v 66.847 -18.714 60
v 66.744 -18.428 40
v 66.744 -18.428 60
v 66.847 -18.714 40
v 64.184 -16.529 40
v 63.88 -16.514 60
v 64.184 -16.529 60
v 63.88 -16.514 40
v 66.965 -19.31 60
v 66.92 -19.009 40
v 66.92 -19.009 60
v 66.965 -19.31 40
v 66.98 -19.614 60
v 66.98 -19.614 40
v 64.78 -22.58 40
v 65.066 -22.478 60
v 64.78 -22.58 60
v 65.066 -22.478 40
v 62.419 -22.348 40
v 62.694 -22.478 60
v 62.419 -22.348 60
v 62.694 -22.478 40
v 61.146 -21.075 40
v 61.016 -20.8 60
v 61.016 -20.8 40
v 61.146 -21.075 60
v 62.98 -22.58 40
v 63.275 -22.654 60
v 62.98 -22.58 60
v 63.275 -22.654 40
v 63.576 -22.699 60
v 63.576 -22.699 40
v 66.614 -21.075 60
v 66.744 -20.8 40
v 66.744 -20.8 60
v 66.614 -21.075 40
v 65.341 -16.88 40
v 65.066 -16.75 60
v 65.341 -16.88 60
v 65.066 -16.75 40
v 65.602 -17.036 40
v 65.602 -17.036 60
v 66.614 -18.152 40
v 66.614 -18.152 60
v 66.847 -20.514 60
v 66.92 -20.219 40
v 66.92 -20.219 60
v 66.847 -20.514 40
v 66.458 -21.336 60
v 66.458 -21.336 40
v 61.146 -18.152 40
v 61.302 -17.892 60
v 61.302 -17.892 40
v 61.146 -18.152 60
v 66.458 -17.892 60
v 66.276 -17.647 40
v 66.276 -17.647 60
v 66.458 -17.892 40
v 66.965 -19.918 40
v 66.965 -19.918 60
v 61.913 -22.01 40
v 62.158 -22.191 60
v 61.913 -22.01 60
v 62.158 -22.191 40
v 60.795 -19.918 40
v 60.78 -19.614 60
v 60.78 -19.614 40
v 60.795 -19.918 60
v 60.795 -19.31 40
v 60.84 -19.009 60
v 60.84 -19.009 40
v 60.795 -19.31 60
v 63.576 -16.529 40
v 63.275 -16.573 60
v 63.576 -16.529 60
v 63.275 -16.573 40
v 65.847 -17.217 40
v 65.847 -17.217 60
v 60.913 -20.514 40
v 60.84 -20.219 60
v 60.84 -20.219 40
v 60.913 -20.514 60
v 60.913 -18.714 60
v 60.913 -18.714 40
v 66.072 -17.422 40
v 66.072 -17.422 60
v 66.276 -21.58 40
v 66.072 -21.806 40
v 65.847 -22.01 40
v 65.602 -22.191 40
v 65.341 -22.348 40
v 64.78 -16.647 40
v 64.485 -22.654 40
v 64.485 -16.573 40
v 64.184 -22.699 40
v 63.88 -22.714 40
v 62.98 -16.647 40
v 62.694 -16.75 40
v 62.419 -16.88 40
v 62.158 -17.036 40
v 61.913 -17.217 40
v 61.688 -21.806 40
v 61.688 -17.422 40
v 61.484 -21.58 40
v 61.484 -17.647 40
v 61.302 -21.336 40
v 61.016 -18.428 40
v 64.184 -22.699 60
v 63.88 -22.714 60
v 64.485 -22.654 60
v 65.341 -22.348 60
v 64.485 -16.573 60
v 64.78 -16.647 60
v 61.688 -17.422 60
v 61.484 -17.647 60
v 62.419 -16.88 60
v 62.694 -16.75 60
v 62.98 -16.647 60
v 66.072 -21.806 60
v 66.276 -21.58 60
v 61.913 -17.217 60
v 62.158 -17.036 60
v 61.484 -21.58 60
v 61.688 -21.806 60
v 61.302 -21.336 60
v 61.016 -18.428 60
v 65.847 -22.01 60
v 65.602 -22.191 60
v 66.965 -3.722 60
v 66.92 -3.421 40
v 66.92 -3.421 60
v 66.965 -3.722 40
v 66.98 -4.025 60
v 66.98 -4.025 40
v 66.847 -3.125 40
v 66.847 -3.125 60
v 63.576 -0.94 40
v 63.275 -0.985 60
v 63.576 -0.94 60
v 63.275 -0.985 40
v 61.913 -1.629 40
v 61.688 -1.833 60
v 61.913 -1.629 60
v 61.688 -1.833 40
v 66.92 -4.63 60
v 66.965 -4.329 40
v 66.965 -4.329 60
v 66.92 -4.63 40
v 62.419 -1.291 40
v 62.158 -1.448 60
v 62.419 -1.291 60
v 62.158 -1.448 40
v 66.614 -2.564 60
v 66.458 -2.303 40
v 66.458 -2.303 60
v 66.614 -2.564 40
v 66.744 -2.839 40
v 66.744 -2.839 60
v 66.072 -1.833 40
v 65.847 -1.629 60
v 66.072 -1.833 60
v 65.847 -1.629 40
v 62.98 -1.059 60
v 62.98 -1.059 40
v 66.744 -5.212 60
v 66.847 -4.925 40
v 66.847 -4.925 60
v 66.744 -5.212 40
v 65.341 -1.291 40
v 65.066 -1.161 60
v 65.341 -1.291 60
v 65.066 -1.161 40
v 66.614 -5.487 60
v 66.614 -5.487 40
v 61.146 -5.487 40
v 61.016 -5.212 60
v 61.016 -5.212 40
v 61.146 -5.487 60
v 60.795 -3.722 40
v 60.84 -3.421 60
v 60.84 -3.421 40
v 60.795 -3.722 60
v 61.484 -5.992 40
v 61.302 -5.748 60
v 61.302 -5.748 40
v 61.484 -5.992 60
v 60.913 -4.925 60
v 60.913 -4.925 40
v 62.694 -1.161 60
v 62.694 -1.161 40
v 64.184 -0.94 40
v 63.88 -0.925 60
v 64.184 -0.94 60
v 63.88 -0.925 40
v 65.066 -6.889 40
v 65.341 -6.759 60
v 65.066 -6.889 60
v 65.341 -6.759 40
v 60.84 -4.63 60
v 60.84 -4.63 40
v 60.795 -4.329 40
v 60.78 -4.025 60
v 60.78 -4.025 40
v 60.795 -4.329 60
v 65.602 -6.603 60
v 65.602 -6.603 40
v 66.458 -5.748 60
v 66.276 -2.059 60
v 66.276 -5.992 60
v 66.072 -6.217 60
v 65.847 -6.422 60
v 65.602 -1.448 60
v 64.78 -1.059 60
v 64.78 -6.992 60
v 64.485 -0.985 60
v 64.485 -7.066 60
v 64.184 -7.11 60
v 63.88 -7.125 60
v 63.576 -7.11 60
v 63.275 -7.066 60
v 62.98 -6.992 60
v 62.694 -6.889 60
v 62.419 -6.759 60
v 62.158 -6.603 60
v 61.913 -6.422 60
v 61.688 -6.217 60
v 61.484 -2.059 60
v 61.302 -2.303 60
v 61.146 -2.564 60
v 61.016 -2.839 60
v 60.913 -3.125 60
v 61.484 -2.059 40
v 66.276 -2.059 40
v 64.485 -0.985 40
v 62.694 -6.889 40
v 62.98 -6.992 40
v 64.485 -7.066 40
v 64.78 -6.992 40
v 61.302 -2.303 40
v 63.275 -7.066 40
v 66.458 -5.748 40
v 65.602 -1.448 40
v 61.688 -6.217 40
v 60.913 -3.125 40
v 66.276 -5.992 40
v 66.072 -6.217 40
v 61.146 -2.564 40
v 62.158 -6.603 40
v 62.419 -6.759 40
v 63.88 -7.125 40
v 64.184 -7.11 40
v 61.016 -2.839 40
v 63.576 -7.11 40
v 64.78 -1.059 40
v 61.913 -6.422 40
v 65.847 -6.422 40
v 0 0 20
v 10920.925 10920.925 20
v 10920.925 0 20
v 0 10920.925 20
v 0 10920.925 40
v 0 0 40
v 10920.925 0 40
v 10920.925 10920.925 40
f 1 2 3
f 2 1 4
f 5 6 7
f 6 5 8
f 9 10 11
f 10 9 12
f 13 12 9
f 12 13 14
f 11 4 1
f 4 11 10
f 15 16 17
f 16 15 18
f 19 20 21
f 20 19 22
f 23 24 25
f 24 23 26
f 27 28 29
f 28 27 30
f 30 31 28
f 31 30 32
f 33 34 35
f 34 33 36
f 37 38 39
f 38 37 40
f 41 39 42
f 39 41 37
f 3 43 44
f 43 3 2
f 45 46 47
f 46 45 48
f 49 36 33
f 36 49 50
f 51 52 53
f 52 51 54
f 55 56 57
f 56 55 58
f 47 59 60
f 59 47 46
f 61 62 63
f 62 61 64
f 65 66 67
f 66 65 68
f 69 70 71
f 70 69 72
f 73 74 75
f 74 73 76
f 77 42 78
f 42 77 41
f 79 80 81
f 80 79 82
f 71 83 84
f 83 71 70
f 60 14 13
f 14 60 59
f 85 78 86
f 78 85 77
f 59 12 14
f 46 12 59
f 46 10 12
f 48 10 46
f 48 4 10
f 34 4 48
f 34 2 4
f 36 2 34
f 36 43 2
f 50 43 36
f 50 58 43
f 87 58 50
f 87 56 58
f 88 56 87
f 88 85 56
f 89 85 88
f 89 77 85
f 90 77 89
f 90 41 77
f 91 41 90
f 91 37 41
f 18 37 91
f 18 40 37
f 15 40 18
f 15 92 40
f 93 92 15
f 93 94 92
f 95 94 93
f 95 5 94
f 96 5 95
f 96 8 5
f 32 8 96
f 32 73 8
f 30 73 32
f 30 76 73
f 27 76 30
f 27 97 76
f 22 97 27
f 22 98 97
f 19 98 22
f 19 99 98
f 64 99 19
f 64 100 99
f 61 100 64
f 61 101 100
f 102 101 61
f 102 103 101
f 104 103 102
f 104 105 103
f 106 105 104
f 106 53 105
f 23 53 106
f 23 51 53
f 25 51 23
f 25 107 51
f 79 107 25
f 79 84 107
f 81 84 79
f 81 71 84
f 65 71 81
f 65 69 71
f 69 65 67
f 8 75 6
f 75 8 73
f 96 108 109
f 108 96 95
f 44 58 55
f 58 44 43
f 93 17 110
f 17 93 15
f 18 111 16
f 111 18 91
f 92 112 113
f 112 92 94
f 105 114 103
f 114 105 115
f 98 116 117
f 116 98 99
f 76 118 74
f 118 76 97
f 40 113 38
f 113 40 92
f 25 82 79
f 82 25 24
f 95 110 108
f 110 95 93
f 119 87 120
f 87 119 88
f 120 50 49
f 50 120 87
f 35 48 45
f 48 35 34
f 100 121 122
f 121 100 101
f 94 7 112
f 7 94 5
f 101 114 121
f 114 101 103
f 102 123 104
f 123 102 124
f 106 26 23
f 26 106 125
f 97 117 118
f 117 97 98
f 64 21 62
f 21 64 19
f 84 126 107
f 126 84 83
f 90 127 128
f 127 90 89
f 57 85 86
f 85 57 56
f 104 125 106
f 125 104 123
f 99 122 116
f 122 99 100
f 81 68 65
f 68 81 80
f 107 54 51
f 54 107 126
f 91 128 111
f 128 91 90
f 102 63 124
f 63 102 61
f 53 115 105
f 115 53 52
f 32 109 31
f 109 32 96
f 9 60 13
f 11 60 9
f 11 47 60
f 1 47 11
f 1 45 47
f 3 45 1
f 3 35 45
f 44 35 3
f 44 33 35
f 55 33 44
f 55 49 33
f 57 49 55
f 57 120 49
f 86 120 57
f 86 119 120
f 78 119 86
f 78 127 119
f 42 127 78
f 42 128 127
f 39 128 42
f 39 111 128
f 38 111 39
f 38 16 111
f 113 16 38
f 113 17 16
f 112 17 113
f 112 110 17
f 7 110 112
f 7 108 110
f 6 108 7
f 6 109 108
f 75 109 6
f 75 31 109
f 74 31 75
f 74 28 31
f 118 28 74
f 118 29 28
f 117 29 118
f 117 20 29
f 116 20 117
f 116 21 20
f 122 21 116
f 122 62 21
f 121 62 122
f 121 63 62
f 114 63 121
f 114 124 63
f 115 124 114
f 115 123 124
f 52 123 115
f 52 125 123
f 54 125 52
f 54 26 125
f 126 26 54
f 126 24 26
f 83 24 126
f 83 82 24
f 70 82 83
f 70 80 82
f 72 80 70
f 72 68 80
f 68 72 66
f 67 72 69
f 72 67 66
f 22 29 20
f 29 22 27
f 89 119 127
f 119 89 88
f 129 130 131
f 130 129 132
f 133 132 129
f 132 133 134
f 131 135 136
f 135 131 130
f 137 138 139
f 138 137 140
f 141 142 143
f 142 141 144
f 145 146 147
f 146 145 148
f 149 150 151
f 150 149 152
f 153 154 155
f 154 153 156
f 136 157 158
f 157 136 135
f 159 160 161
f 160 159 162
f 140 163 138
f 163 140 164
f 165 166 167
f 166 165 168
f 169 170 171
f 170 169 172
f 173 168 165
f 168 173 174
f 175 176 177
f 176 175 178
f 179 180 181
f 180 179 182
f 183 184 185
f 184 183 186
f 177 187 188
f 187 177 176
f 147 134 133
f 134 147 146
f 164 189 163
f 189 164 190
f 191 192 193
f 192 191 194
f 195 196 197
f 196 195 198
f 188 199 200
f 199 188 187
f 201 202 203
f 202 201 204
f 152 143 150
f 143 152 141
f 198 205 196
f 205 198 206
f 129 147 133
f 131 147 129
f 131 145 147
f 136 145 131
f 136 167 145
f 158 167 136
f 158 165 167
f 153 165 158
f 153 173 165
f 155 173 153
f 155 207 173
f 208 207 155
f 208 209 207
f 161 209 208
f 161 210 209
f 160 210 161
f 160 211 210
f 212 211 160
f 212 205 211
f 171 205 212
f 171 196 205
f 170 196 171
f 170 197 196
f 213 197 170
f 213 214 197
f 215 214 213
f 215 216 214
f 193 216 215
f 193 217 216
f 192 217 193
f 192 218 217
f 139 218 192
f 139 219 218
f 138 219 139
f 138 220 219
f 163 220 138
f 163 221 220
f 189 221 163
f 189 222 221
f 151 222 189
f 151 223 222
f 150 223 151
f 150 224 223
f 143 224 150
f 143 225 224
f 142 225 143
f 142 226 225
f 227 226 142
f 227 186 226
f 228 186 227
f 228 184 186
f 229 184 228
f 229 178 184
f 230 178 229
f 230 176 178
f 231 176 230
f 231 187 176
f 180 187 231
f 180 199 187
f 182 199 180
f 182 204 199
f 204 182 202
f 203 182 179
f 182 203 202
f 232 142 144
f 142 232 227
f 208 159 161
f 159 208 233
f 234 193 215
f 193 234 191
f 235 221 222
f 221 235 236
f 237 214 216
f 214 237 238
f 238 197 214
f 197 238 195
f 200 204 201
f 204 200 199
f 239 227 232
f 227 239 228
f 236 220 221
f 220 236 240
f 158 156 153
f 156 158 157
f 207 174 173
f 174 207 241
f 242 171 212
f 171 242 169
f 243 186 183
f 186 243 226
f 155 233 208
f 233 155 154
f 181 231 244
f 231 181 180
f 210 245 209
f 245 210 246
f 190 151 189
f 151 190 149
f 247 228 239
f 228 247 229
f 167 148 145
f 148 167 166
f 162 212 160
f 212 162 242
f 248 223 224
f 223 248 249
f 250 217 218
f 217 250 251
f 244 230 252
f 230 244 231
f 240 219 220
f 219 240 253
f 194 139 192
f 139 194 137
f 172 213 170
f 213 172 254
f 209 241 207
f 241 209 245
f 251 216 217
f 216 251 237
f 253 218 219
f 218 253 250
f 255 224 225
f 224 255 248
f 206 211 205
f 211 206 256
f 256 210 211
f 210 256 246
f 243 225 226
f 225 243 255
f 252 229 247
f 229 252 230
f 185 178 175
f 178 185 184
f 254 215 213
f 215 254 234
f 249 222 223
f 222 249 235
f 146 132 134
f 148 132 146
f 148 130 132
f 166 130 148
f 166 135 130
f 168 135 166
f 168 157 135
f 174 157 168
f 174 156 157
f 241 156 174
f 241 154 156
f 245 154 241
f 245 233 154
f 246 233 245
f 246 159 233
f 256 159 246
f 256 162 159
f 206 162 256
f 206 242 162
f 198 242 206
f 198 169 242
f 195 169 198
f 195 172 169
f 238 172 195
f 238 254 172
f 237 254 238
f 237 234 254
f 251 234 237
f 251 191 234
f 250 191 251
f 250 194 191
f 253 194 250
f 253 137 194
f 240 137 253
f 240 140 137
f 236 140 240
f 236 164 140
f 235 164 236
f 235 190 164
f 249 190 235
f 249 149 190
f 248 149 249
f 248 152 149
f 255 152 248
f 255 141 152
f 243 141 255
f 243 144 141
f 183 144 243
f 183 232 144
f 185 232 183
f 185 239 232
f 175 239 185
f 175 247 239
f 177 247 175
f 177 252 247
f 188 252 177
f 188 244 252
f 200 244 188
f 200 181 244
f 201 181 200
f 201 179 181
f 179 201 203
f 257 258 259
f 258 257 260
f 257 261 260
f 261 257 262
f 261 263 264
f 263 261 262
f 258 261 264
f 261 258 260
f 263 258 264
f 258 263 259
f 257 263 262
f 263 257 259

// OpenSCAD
// Dimensions in mm
X = 127.76;
Y = 85.48;
Z = 20;

// Hole dimensions and grid parameters
hole_diameter = 6.2;
hole_spacing_x = 9.0;
hole_spacing_y = hole_spacing_x * sqrt(3);
num_rows = 8;
num_cols = 12;
first_hole_x = (X - num_cols * hole_spacing_x) / 2;
first_hole_y = (Y - num_rows * hole_spacing_y) / 2;

// Chamfer dimensions
chamfer_leg_length = 5.0;
chamfer_angle = 45;

// Build the rack
translate([0, 0, Z]) {
    // Top and bottom plates
    linear_extrude(Z) {
        square(X * Y);
    }
    
    // Vertical edges with chamfers
    for (y = [0, hole_spacing_y]) {
        translate([first_hole_x + num_cols * hole_spacing_x / 2, first_hole_y + y, Z])
            rotate_extrude(45) {
                linear_extrude(Z - chamfer_leg_length)
                    square(chamfer_leg_length);
            }
    }

    // Vertical through-holes
    for (y = [0, hole_spacing_y]) {
        translate([first_hole_x + num_cols * hole_spacing_x / 2, first_hole_y + y, Z])
            cylinder(h = Z, r = hole_diameter / 2, $fn = 64);
    }

    // Orientation mark at A1 corner
    translate([first_hole_x + num_cols * hole_spacing_x / 2 - chamfer_leg_length / 2, first_hole_y + num_rows * hole_spacing_y / 2, Z])
        rotate_extrude(45) {
            linear_extrude(Z - chamfer_leg_length)
                square(chamfer_leg_length);
        }
}
